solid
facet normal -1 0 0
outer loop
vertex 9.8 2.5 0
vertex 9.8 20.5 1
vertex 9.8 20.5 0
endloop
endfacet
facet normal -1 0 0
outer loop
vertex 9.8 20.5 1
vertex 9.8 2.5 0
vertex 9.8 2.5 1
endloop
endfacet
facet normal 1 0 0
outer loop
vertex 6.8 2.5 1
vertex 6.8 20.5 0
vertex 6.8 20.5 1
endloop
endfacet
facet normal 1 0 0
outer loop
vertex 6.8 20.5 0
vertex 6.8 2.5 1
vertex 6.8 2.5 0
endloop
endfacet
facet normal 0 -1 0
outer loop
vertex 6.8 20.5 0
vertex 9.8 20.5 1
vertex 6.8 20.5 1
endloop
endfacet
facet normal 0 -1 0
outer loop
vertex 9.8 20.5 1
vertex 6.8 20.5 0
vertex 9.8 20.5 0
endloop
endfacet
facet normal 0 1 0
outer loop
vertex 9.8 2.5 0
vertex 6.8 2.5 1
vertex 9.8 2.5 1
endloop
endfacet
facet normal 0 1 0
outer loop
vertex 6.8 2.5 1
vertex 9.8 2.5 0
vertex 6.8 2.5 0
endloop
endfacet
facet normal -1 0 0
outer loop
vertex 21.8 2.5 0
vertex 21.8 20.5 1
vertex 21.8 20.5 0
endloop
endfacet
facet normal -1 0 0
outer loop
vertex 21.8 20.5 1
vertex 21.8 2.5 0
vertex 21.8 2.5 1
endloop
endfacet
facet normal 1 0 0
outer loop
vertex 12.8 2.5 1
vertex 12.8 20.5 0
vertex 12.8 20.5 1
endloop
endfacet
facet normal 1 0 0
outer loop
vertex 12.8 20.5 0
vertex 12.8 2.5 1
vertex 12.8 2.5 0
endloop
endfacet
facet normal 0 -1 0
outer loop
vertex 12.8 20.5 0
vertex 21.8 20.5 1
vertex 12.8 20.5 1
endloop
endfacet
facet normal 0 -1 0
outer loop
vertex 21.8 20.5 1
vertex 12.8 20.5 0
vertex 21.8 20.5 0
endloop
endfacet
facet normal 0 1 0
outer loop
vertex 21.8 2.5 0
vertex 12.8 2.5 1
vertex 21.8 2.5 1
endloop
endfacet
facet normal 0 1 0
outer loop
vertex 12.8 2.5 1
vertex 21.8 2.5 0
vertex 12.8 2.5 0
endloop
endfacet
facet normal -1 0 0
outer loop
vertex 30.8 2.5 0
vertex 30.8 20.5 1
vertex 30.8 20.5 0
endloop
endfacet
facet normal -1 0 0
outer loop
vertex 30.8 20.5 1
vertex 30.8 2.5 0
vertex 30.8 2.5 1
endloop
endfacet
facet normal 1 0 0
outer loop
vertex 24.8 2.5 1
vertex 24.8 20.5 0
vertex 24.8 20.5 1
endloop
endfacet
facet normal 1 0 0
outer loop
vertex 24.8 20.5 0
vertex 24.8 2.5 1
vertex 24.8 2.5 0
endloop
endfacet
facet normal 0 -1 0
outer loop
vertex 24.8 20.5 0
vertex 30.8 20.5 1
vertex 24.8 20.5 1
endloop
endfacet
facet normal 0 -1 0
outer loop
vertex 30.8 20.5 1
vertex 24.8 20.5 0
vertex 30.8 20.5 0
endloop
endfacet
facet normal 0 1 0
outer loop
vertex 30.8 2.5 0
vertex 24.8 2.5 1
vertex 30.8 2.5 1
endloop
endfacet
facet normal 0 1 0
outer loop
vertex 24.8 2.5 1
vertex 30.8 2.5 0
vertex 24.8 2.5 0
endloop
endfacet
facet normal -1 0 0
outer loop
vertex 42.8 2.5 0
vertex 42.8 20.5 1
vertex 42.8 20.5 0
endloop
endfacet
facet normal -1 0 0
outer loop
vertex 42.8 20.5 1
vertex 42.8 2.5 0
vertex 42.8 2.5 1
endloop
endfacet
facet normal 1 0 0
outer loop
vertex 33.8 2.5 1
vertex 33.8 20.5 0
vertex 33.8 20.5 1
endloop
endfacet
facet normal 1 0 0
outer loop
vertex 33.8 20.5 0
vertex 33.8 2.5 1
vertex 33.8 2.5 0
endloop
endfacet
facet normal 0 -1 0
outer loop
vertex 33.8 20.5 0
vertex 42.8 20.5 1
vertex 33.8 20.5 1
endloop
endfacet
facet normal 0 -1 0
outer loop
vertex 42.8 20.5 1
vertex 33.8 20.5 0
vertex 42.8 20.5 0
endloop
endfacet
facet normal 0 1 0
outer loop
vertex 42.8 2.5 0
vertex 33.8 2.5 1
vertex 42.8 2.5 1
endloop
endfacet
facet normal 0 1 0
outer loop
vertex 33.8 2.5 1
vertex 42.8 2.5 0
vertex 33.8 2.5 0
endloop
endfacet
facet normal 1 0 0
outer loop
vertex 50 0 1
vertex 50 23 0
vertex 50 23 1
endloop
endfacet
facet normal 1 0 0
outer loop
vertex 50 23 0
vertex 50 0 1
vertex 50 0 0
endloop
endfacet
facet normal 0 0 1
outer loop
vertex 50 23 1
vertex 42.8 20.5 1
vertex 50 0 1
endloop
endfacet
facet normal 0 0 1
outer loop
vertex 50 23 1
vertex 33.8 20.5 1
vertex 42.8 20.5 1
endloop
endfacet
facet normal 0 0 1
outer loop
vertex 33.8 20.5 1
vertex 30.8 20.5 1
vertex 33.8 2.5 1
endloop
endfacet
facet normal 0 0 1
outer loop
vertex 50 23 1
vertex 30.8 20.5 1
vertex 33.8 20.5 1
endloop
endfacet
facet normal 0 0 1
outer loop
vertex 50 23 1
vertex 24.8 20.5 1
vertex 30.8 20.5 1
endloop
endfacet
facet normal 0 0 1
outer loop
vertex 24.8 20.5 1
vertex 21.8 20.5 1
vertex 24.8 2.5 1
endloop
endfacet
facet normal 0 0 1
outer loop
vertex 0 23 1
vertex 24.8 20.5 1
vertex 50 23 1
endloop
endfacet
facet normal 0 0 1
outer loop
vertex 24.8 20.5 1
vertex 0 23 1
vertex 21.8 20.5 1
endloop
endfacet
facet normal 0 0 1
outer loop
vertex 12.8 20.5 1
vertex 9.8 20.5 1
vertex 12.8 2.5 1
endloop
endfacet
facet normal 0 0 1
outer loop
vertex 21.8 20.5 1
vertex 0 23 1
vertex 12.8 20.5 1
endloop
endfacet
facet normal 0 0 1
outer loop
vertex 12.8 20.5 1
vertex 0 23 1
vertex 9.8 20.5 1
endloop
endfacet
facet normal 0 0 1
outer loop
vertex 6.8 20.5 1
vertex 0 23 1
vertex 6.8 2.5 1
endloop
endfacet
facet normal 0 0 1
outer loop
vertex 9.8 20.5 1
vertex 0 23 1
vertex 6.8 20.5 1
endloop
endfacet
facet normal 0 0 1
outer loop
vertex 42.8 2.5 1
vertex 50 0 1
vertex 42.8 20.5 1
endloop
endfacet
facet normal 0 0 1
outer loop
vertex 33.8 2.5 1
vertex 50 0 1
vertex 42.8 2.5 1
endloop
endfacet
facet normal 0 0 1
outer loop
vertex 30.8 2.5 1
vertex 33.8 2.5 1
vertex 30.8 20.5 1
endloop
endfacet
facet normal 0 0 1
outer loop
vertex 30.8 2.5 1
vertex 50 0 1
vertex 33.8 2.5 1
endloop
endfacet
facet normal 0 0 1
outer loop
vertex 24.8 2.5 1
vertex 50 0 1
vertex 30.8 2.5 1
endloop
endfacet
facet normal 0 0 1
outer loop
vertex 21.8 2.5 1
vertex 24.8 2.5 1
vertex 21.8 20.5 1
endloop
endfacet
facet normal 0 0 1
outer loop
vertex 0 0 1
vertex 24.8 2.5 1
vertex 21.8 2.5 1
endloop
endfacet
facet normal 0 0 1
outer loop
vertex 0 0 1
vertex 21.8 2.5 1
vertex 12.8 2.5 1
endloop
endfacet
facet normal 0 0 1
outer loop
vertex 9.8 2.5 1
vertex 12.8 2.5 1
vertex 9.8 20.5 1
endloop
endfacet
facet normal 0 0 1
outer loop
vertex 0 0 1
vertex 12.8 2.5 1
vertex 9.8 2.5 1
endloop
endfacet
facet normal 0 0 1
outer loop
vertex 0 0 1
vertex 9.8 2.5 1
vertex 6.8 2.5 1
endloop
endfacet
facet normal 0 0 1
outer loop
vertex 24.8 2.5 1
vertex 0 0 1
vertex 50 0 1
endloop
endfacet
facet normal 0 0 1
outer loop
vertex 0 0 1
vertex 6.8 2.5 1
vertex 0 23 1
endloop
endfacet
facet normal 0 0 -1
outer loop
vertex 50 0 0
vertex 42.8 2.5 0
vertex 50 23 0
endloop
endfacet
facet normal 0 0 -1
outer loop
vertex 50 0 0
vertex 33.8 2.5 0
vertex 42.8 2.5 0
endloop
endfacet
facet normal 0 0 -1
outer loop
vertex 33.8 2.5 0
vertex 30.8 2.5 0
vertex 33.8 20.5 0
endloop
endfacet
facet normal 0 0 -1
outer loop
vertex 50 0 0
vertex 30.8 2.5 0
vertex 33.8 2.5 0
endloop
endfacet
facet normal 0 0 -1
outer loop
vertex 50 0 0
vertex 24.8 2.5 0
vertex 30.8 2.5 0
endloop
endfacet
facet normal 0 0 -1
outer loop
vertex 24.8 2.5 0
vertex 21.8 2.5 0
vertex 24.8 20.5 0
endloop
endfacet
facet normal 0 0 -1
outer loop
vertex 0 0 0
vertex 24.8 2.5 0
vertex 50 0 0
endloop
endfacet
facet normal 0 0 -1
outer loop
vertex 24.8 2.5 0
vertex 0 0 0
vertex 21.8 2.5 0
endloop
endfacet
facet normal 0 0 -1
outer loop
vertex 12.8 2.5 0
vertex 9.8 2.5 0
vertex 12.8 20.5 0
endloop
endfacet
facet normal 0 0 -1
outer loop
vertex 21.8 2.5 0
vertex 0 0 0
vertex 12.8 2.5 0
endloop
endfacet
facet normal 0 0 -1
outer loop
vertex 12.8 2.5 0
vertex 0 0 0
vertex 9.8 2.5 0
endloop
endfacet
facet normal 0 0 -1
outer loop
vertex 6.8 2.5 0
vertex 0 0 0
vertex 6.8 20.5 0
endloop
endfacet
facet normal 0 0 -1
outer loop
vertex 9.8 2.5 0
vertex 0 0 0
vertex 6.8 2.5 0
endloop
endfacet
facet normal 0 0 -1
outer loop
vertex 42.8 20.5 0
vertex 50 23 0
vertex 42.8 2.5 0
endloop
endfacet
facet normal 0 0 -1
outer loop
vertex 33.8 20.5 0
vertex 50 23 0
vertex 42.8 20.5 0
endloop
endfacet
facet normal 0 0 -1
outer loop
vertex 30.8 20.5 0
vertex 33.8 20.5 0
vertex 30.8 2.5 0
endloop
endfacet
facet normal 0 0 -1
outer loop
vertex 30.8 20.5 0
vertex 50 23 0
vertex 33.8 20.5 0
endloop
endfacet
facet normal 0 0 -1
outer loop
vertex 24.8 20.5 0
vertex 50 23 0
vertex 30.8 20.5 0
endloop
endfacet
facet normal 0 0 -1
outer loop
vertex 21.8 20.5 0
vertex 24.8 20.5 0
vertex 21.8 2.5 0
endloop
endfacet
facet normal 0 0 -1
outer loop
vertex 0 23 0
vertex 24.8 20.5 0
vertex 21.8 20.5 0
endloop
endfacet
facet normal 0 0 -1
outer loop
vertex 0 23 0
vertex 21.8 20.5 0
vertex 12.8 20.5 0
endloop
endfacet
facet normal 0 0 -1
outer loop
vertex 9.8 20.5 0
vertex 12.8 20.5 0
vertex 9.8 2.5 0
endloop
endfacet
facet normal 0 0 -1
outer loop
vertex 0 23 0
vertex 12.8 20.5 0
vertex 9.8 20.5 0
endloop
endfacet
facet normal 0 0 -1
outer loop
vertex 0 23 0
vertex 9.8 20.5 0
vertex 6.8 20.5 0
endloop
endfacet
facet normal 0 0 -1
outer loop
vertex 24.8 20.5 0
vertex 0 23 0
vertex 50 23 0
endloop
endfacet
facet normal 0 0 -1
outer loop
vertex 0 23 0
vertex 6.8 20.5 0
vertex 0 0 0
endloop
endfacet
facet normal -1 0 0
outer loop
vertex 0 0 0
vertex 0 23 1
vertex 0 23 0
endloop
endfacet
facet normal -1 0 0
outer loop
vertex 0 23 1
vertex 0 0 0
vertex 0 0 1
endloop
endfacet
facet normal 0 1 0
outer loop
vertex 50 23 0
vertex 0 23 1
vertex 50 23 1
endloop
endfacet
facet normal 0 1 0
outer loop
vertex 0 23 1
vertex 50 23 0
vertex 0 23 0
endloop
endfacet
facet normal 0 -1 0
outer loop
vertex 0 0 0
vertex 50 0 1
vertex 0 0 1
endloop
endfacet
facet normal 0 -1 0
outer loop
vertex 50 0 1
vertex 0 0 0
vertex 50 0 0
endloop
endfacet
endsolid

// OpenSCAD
// file: ../../../plate/tix-clock-plate.scad
module dotstarMatrixTixClockPlate()
{
    // this next bit of comment code was to see if the .png woulc be used as a
    // guide to make the holes.  but I was not able to use it the way I wanted :(
/*
    svgScale = 0.0927;
    color("blue")
    translate([-0.029, -6.6, -11])
    scale([svgScale, svgScale, svgScale])
    surface("adafruit-dotstar-wing.png");
*/

    difference()
    {
        xLength = dotstarMatrixTixClockPlate_xLength();
        yLength = dotstarMatrixTixClockPlate_yLength();

        cube([xLength, 23, 1]);

        dotstarMatrixTixClockPlate_cutouts();
    }
}

module dotstarMatrixTixClockPlate_cutouts()
{
    cutoutLengthX = dotstarMatrixTixClockPlate_cutouts_xLength();
    cutoutLengthY = dotstarMatrixTixClockPlate_cutouts_yLength();

    xTranslate = dotstarMatrixTixClockPlate_cutouts_hourTens_xTranslate();
    yTranslate = dotstarMatrixTixClockPlate_cutouts_hourTens_yTranslate();

    // hour tens cutout
    translate([xTranslate, yTranslate, -0.01])
    cube([cutoutLengthX, cutoutLengthY, 1.02]);

    // hour ones cutout
    dotstarMatrixTixClockPlate_cutouts_hourOnes();

    dotstarMatrixTixClockPlate_cutouts_minuteTens();

    dotstarMatrixTixClockPlate_cutouts_minuteOnes();
}

module dotstarMatrixTixClockPlate_cutouts_hourOnes()
{
    xTranslate = dotstarMatrixTixClockPlate_cutouts_minuteTens_xTranslate()
                 ;

    yTranslate = dotstarMatrixTixClockPlate_cutouts_hourTens_yTranslate();

    cutoutLengthX = dotstarMatrixTixClockPlate_cutouts_xLength() * 3;
    cutoutLengthY = dotstarMatrixTixClockPlate_cutouts_yLength();

    translate([xTranslate, yTranslate, -0.01])
    cube([cutoutLengthX, cutoutLengthY, 1.02]);
}

module dotstarMatrixTixClockPlate_cutouts_minuteTens()
{
    xTranslate = dotstarMatrixTixClockPlate_cutouts_minuteTens_xTranslate()
                 + dotstarMatrixTixClockPlate_cutouts_xLength() * 4;

    yTranslate = dotstarMatrixTixClockPlate_cutouts_hourTens_yTranslate();

    cutoutLengthX = dotstarMatrixTixClockPlate_cutouts_xLength() * 2;
    cutoutLengthY = dotstarMatrixTixClockPlate_cutouts_yLength();

    translate([xTranslate, yTranslate, -0.01])
    cube([cutoutLengthX, cutoutLengthY, 1.02]);
}

module dotstarMatrixTixClockPlate_cutouts_minuteOnes()
{
    xTranslate = dotstarMatrixTixClockPlate_cutouts_minuteTens_xTranslate()
                 + dotstarMatrixTixClockPlate_cutouts_xLength() * 7;

    yTranslate = dotstarMatrixTixClockPlate_cutouts_hourTens_yTranslate();

    cutoutLengthX = dotstarMatrixTixClockPlate_cutouts_xLength() * 3;
    cutoutLengthY = dotstarMatrixTixClockPlate_cutouts_yLength();

    translate([xTranslate, yTranslate, -0.01])
    cube([cutoutLengthX, cutoutLengthY, 1.02]);
}

function dotstarMatrixTixClockPlate_cutouts_minuteTens_xTranslate() = dotstarMatrixTixClockPlate_cutouts_hourTens_xTranslate()
                                                           + dotstarMatrixTixClockPlate_cutouts_xLength() * 2;

function dotstarMatrixTixClockPlate_cutouts_hourOnes_xTranslate() = 0;


function dotstarMatrixTixClockPlate_xLength() = 50;

function dotstarMatrixTixClockPlate_yLength() = 23;

function dotstarMatrixTixClockPlate_cutouts_xLength() = 3.0;

function dotstarMatrixTixClockPlate_cutouts_yLength() = 18;

function dotstarMatrixTixClockPlate_cutouts_hourTens_xTranslate() = 6.8;

function dotstarMatrixTixClockPlate_cutouts_hourTens_yTranslate() = (dotstarMatrixTixClockPlate_yLength()
                                                                        - dotstarMatrixTixClockPlate_cutouts_yLength())
                                                                        / 2.0;
// file: ../dotstar-tix-clock-cover.scad
use <../../plate/tix-clock-plate.scad>

module dotstarTixClockCover()
{
    union()
    {
        dotstarMatrixTixClockPlate();

        
    }
}
// main file
use <../dotstar-tix-clock-cover.scad>

dotstarTixClockCover();
